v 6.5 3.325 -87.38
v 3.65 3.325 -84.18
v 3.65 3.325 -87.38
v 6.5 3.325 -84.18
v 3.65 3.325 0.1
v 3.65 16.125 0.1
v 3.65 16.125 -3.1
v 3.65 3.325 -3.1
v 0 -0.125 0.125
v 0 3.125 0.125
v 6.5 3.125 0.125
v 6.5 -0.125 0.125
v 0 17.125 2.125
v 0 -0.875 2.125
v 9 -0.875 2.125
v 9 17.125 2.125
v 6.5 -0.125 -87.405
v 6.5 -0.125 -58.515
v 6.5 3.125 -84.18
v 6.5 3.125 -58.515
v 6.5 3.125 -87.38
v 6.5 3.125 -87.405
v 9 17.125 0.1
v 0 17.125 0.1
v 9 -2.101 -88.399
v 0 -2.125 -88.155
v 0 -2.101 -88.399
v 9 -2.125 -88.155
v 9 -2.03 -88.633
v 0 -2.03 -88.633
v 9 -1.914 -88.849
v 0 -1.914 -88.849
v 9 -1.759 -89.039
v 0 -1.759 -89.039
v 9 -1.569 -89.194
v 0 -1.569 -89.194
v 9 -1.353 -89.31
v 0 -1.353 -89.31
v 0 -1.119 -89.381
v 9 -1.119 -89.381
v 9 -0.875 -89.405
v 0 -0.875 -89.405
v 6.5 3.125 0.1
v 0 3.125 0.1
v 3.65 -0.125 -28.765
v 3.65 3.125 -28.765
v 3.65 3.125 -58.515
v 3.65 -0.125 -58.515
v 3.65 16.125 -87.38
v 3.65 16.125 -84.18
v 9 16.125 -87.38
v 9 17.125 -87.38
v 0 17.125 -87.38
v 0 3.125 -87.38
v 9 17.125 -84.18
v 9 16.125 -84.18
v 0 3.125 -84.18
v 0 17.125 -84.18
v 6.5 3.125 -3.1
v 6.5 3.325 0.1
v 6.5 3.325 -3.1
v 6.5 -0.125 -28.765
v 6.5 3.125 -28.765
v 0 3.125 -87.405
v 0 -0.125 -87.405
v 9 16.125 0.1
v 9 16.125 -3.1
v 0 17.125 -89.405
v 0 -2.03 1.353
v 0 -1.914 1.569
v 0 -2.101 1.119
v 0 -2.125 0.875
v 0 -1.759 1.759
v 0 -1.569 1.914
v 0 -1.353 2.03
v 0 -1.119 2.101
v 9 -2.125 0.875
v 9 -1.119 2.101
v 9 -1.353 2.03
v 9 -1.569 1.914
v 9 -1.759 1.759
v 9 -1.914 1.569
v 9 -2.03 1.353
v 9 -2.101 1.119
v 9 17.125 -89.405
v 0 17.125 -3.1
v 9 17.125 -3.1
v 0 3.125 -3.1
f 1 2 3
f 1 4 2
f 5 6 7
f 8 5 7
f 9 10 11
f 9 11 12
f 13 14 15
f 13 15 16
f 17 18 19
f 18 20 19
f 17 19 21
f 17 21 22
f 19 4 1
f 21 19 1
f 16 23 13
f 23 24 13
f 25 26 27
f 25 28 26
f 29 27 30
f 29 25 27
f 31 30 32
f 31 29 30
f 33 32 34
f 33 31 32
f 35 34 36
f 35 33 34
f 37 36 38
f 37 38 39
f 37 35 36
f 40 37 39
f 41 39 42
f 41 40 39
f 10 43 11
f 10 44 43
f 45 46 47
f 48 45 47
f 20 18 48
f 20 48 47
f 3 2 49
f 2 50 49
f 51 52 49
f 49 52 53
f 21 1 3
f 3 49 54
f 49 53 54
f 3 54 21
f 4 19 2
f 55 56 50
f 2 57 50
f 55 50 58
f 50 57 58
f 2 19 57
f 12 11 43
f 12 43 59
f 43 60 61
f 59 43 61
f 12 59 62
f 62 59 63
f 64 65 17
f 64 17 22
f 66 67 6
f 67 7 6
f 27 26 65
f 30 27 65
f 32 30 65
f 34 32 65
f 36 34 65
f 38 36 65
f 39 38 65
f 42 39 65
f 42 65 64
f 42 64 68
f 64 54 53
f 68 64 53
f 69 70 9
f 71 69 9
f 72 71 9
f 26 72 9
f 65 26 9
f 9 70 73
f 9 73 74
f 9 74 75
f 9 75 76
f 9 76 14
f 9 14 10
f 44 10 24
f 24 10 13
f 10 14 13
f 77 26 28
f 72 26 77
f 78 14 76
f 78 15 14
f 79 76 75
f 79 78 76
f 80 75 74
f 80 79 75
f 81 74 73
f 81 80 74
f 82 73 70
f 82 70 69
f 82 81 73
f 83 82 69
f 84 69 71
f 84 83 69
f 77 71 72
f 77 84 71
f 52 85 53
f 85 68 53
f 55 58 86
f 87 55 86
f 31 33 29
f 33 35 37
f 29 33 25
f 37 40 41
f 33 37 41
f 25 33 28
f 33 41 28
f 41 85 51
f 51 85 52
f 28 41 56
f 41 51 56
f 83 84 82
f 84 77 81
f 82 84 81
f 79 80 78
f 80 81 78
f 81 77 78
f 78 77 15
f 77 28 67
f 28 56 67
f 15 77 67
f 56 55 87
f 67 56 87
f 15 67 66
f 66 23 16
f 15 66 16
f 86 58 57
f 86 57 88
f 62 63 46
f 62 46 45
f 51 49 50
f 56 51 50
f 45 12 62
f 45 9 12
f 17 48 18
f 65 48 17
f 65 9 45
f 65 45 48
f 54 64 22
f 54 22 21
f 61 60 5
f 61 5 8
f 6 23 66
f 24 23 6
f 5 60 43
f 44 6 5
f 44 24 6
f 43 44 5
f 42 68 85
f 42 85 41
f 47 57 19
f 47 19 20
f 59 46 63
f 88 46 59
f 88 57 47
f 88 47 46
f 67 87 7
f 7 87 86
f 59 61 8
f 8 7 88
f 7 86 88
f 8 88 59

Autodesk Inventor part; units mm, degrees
ref_plane "YZ Plane" through (0, 0, 0) normal (1, 0, 0) x (0, 1, 0)
ref_plane "XZ Plane" through (0, 0, 0) normal (0, 1, 0) x (-1, 0, 0)
ref_plane "XY Plane" through (0, 0, 0) normal (0, 0, 1) x (1, 0, 0)
sketch "Sketch1" plane through (0, 0, 0) normal (1, 0, 0) x (0, 1, 0)
  line L0 (0, 0) -> (3, 0)
  line L1 (3, 0) -> (3, -87.28)
  line L2 (3, -87.28) -> (0, -87.28)
  line L3 (0, -87.28) -> (0, 0)
  line L4 (3.125, -87.405) -> (3.125, 0.125)
  line L5 (3.125, 0.125) -> (-0.125, 0.125)
  line L6 (-0.125, 0.125) -> (-0.125, -87.405)
  line L7 (-0.125, -87.405) -> (3.125, -87.405)
  line L8 (5.125, 2.125) -> (5.125, -89.405)
  line L9 (5.125, -89.405) -> (-2.125, -89.405)
  line L10 (-2.125, -89.405) -> (-2.125, 2.125)
  line L11 (-2.125, 2.125) -> (5.125, 2.125)
  line L12 (3, -87.28) -> (15, -87.28)
  line L13 (15, -87.28) -> (15, -84.28)
  line L14 (15, -84.28) -> (3, -84.28)
  line L15 (3, -84.28) -> (3, -87.28)
  line L16 (3, 0) -> (15, 0)
  line L17 (15, 0) -> (15, -3)
  line L18 (15, -3) -> (3, -3)
  line L19 (3, -3) -> (3, 0)
  line L20 (15.1, 0.1) -> (2.9, 0.1)
  line L21 (2.9, 0.1) -> (2.9, -3.1)
  line L22 (2.9, -3.1) -> (15.1, -3.1)
  line L23 (15.1, -3.1) -> (15.1, 0.1)
  line L24 (15.1, -87.38) -> (2.9, -87.38)
  line L25 (2.9, -87.38) -> (2.9, -84.18)
  line L26 (2.9, -84.18) -> (15.1, -84.18)
  line L27 (15.1, -84.18) -> (15.1, -87.38)
  line L28 (0.875, -89.405) -> (17.125, -89.405)
  line L29 (17.125, -89.405) -> (17.125, -82.155)
  line L30 (17.125, -82.155) -> (0.875, -82.155)
  line L31 (0.875, -82.155) -> (0.875, -89.405)
  line L32 (17.125, 2.125) -> (0.875, 2.125)
  line L33 (0.875, 2.125) -> (0.875, -5.125)
  line L34 (0.875, -5.125) -> (17.125, -5.125)
  line L35 (17.125, -5.125) -> (17.125, 2.125)
  line L36 (15.1, 0.1) -> (17.125, 0.1)
  line L37 (15.1, -3.1) -> (17.125, -3.1)
  line L38 (15.1, -87.38) -> (17.125, -87.38)
  line L39 (15.1, -84.18) -> (17.125, -84.18)
  point P0 (5.125, -82.155)
  point P1 (5.125, -5.125)
  point P2 (3.125, -84.18)
  point P3 (3.125, -87.38)
  point P4 (3.125, 0.1)
  point P5 (3.125, -3.1)
  dimension "d0" = 87.28
  dimension "d1" = 3
  dimension "d2" = 0.125
  dimension "d3" = 2
  dimension "d4" = 12
  dimension "d5" = 3
  dimension "d6" = 12
  dimension "d7" = 3
  dimension "d8" = 0.1
  dimension "d9" = 0.1
  dimension "d10" = 0
  dimension "d11" = 0
extrude "Extrusion1" add sketch "Sketch1" along normal blind 6.5 contours L33 L11 L8 L20 L4 L5 | L5 L6 L7 L31 L9 L10 L11 L33 | L7 L4 L24 L8 L9 L31 | L32 L35 L36 L20 L8 | L34 L8 L30 L4 | L4 L22 L8 L34 | L30 L8 L26 L4 | L8 L22 L37 L35 L34 | L8 L24 L38 L29 L28 | L30 L29 L39 L26 L8
sketch "Sketch2" plane through (6.5, 0, 0) normal (1, 0, 0) x (0, 0, -1)
  line L0 (3.1, 16.125) -> (-0.1, 16.125)
  line L1 (-0.1, 16.125) -> (-0.1, 3.325)
  line L2 (-0.1, 3.325) -> (3.1, 3.325)
  line L3 (3.1, 3.325) -> (3.1, 16.125)
  line L4 (3.1, 3.125) -> (84.18, 3.125) projected
  line L5 (5.125, 17.125) -> (3.1, 17.125) projected
  line L6 (-0.1, 3.125) -> (-0.1, 17.125) projected
  line L7 (3.1, 17.125) -> (3.1, 3.125) projected
  line L8 (84.18, 3.325) -> (87.38, 3.325)
  line L9 (87.38, 3.325) -> (87.38, 16.125)
  line L10 (87.38, 16.125) -> (84.18, 16.125)
  line L11 (84.18, 16.125) -> (84.18, 3.325)
  line L12 (89.405, 17.125) -> (87.38, 17.125) projected
  line L13 (87.38, 17.125) -> (87.38, 3.125) projected
  line L14 (84.18, 3.125) -> (84.18, 17.125) projected
  line L15 (28.765, -0.125) -> (58.515, -0.125)
  line L16 (58.515, -0.125) -> (58.515, 3.125)
  line L17 (58.515, 3.125) -> (28.765, 3.125)
  line L18 (28.765, 3.125) -> (28.765, -0.125)
  line L19 (87.405, -0.125) -> (-0.125, -0.125) projected
  line L20 (-0.125, -0.125) -> (-0.125, 3.125) projected
  point P0 (0, 0)
  dimension "d14" = 0.2
  dimension "d15" = 1
  dimension "d16" = 0
  dimension "d17" = 0
  dimension "d18" = 0.2
  dimension "d19" = 1
  dimension "d20" = 0
  dimension "d21" = 0
  dimension "d22" = 29.75
  dimension "d23" = 0
  dimension "d24" = 0
  dimension "d25" = 28.89
extrude "Extrusion2" add sketch "Sketch2" against normal blind 2.85
sketch "Sketch3" plane through (6.5, 0, 0) normal (1, 0, 0) x (0, 0, -1)
  line L0 (84.18, 16.125) -> (84.18, 17.125) projected
  line L1 (84.18, 17.125) -> (82.155, 17.125) projected
  line L2 (82.155, 17.125) -> (82.155, 5.125) projected
  line L3 (82.155, 5.125) -> (5.125, 5.125) projected
  line L4 (5.125, 5.125) -> (5.125, 17.125) projected
  line L5 (5.125, 17.125) -> (3.1, 17.125) projected
  line L6 (3.1, 17.125) -> (3.1, 16.125) projected
  line L7 (3.1, 16.125) -> (-0.1, 16.125) projected
  line L8 (-0.1, 16.125) -> (-0.1, 17.125) projected
  line L9 (-0.1, 17.125) -> (-2.125, 17.125) projected
  line L10 (-2.125, 17.125) -> (-2.125, -2.125) projected
  line L11 (-2.125, -2.125) -> (89.405, -2.125) projected
  line L12 (89.405, -2.125) -> (89.405, 17.125) projected
  line L13 (89.405, 17.125) -> (87.38, 17.125) projected
  line L14 (87.38, 17.125) -> (87.38, 16.125) projected
  line L15 (87.38, 16.125) -> (84.18, 16.125) projected
  line L16 (84.18, 3.325) -> (87.38, 3.325) projected
  line L17 (87.38, 3.325) -> (87.38, 3.125) projected
  line L18 (87.38, 3.125) -> (87.405, 3.125) projected
  line L19 (87.405, 3.125) -> (87.405, -0.125) projected
  line L20 (87.405, -0.125) -> (58.515, -0.125) projected
  line L21 (58.515, -0.125) -> (58.515, 3.125) projected
  line L22 (58.515, 3.125) -> (84.18, 3.125) projected
  line L23 (84.18, 3.125) -> (84.18, 3.325) projected
  line L24 (28.765, 3.125) -> (28.765, -0.125) projected
  line L25 (28.765, -0.125) -> (-0.125, -0.125) projected
  line L26 (-0.125, -0.125) -> (-0.125, 3.125) projected
  line L27 (-0.125, 3.125) -> (-0.1, 3.125) projected
  line L28 (-0.1, 3.125) -> (-0.1, 3.325) projected
  line L29 (-0.1, 3.325) -> (3.1, 3.325) projected
  line L30 (3.1, 3.325) -> (3.1, 3.125) projected
  line L31 (3.1, 3.125) -> (28.765, 3.125) projected
  point P0 (0, 0)
extrude "Extrusion4" add sketch "Sketch3" along normal blind 2.5 contours L15 L14 L13 L12 L11 L10 L9 L8 L7 L6 L5 L4 L3 L2 L1 L0 | L16 L17 L18 L19 L20 L21 L22 L23 | L24 L25 L26 L27 L28 L29 L30 L31
sketch "Sketch4" plane through (0, 0, 0) normal (-1, 0, 0) x (0, 0, 1)
  line L0 (-5.125, 5.125) -> (-5.125, 17.125) projected
  line L1 (-82.155, 17.125) -> (-82.155, 5.125) projected
  line L2 (-5.125, 5.125) -> (-82.155, 5.125)
  line L3 (-82.155, 5.125) -> (-82.155, 17.125)
  line L4 (-82.155, 17.125) -> (-5.125, 17.125)
  line L5 (-5.125, 17.125) -> (-5.125, 5.125)
  point P0 (0, 0)
extrude "Extrusion5" add sketch "Sketch4" against normal up to surface (9 mm away)
fillet "Fillet1" radius 1.25 2 edges at (4.5, -2.125, 2.125) (4.5, -2.125, -89.405)
properties part number "Front"
